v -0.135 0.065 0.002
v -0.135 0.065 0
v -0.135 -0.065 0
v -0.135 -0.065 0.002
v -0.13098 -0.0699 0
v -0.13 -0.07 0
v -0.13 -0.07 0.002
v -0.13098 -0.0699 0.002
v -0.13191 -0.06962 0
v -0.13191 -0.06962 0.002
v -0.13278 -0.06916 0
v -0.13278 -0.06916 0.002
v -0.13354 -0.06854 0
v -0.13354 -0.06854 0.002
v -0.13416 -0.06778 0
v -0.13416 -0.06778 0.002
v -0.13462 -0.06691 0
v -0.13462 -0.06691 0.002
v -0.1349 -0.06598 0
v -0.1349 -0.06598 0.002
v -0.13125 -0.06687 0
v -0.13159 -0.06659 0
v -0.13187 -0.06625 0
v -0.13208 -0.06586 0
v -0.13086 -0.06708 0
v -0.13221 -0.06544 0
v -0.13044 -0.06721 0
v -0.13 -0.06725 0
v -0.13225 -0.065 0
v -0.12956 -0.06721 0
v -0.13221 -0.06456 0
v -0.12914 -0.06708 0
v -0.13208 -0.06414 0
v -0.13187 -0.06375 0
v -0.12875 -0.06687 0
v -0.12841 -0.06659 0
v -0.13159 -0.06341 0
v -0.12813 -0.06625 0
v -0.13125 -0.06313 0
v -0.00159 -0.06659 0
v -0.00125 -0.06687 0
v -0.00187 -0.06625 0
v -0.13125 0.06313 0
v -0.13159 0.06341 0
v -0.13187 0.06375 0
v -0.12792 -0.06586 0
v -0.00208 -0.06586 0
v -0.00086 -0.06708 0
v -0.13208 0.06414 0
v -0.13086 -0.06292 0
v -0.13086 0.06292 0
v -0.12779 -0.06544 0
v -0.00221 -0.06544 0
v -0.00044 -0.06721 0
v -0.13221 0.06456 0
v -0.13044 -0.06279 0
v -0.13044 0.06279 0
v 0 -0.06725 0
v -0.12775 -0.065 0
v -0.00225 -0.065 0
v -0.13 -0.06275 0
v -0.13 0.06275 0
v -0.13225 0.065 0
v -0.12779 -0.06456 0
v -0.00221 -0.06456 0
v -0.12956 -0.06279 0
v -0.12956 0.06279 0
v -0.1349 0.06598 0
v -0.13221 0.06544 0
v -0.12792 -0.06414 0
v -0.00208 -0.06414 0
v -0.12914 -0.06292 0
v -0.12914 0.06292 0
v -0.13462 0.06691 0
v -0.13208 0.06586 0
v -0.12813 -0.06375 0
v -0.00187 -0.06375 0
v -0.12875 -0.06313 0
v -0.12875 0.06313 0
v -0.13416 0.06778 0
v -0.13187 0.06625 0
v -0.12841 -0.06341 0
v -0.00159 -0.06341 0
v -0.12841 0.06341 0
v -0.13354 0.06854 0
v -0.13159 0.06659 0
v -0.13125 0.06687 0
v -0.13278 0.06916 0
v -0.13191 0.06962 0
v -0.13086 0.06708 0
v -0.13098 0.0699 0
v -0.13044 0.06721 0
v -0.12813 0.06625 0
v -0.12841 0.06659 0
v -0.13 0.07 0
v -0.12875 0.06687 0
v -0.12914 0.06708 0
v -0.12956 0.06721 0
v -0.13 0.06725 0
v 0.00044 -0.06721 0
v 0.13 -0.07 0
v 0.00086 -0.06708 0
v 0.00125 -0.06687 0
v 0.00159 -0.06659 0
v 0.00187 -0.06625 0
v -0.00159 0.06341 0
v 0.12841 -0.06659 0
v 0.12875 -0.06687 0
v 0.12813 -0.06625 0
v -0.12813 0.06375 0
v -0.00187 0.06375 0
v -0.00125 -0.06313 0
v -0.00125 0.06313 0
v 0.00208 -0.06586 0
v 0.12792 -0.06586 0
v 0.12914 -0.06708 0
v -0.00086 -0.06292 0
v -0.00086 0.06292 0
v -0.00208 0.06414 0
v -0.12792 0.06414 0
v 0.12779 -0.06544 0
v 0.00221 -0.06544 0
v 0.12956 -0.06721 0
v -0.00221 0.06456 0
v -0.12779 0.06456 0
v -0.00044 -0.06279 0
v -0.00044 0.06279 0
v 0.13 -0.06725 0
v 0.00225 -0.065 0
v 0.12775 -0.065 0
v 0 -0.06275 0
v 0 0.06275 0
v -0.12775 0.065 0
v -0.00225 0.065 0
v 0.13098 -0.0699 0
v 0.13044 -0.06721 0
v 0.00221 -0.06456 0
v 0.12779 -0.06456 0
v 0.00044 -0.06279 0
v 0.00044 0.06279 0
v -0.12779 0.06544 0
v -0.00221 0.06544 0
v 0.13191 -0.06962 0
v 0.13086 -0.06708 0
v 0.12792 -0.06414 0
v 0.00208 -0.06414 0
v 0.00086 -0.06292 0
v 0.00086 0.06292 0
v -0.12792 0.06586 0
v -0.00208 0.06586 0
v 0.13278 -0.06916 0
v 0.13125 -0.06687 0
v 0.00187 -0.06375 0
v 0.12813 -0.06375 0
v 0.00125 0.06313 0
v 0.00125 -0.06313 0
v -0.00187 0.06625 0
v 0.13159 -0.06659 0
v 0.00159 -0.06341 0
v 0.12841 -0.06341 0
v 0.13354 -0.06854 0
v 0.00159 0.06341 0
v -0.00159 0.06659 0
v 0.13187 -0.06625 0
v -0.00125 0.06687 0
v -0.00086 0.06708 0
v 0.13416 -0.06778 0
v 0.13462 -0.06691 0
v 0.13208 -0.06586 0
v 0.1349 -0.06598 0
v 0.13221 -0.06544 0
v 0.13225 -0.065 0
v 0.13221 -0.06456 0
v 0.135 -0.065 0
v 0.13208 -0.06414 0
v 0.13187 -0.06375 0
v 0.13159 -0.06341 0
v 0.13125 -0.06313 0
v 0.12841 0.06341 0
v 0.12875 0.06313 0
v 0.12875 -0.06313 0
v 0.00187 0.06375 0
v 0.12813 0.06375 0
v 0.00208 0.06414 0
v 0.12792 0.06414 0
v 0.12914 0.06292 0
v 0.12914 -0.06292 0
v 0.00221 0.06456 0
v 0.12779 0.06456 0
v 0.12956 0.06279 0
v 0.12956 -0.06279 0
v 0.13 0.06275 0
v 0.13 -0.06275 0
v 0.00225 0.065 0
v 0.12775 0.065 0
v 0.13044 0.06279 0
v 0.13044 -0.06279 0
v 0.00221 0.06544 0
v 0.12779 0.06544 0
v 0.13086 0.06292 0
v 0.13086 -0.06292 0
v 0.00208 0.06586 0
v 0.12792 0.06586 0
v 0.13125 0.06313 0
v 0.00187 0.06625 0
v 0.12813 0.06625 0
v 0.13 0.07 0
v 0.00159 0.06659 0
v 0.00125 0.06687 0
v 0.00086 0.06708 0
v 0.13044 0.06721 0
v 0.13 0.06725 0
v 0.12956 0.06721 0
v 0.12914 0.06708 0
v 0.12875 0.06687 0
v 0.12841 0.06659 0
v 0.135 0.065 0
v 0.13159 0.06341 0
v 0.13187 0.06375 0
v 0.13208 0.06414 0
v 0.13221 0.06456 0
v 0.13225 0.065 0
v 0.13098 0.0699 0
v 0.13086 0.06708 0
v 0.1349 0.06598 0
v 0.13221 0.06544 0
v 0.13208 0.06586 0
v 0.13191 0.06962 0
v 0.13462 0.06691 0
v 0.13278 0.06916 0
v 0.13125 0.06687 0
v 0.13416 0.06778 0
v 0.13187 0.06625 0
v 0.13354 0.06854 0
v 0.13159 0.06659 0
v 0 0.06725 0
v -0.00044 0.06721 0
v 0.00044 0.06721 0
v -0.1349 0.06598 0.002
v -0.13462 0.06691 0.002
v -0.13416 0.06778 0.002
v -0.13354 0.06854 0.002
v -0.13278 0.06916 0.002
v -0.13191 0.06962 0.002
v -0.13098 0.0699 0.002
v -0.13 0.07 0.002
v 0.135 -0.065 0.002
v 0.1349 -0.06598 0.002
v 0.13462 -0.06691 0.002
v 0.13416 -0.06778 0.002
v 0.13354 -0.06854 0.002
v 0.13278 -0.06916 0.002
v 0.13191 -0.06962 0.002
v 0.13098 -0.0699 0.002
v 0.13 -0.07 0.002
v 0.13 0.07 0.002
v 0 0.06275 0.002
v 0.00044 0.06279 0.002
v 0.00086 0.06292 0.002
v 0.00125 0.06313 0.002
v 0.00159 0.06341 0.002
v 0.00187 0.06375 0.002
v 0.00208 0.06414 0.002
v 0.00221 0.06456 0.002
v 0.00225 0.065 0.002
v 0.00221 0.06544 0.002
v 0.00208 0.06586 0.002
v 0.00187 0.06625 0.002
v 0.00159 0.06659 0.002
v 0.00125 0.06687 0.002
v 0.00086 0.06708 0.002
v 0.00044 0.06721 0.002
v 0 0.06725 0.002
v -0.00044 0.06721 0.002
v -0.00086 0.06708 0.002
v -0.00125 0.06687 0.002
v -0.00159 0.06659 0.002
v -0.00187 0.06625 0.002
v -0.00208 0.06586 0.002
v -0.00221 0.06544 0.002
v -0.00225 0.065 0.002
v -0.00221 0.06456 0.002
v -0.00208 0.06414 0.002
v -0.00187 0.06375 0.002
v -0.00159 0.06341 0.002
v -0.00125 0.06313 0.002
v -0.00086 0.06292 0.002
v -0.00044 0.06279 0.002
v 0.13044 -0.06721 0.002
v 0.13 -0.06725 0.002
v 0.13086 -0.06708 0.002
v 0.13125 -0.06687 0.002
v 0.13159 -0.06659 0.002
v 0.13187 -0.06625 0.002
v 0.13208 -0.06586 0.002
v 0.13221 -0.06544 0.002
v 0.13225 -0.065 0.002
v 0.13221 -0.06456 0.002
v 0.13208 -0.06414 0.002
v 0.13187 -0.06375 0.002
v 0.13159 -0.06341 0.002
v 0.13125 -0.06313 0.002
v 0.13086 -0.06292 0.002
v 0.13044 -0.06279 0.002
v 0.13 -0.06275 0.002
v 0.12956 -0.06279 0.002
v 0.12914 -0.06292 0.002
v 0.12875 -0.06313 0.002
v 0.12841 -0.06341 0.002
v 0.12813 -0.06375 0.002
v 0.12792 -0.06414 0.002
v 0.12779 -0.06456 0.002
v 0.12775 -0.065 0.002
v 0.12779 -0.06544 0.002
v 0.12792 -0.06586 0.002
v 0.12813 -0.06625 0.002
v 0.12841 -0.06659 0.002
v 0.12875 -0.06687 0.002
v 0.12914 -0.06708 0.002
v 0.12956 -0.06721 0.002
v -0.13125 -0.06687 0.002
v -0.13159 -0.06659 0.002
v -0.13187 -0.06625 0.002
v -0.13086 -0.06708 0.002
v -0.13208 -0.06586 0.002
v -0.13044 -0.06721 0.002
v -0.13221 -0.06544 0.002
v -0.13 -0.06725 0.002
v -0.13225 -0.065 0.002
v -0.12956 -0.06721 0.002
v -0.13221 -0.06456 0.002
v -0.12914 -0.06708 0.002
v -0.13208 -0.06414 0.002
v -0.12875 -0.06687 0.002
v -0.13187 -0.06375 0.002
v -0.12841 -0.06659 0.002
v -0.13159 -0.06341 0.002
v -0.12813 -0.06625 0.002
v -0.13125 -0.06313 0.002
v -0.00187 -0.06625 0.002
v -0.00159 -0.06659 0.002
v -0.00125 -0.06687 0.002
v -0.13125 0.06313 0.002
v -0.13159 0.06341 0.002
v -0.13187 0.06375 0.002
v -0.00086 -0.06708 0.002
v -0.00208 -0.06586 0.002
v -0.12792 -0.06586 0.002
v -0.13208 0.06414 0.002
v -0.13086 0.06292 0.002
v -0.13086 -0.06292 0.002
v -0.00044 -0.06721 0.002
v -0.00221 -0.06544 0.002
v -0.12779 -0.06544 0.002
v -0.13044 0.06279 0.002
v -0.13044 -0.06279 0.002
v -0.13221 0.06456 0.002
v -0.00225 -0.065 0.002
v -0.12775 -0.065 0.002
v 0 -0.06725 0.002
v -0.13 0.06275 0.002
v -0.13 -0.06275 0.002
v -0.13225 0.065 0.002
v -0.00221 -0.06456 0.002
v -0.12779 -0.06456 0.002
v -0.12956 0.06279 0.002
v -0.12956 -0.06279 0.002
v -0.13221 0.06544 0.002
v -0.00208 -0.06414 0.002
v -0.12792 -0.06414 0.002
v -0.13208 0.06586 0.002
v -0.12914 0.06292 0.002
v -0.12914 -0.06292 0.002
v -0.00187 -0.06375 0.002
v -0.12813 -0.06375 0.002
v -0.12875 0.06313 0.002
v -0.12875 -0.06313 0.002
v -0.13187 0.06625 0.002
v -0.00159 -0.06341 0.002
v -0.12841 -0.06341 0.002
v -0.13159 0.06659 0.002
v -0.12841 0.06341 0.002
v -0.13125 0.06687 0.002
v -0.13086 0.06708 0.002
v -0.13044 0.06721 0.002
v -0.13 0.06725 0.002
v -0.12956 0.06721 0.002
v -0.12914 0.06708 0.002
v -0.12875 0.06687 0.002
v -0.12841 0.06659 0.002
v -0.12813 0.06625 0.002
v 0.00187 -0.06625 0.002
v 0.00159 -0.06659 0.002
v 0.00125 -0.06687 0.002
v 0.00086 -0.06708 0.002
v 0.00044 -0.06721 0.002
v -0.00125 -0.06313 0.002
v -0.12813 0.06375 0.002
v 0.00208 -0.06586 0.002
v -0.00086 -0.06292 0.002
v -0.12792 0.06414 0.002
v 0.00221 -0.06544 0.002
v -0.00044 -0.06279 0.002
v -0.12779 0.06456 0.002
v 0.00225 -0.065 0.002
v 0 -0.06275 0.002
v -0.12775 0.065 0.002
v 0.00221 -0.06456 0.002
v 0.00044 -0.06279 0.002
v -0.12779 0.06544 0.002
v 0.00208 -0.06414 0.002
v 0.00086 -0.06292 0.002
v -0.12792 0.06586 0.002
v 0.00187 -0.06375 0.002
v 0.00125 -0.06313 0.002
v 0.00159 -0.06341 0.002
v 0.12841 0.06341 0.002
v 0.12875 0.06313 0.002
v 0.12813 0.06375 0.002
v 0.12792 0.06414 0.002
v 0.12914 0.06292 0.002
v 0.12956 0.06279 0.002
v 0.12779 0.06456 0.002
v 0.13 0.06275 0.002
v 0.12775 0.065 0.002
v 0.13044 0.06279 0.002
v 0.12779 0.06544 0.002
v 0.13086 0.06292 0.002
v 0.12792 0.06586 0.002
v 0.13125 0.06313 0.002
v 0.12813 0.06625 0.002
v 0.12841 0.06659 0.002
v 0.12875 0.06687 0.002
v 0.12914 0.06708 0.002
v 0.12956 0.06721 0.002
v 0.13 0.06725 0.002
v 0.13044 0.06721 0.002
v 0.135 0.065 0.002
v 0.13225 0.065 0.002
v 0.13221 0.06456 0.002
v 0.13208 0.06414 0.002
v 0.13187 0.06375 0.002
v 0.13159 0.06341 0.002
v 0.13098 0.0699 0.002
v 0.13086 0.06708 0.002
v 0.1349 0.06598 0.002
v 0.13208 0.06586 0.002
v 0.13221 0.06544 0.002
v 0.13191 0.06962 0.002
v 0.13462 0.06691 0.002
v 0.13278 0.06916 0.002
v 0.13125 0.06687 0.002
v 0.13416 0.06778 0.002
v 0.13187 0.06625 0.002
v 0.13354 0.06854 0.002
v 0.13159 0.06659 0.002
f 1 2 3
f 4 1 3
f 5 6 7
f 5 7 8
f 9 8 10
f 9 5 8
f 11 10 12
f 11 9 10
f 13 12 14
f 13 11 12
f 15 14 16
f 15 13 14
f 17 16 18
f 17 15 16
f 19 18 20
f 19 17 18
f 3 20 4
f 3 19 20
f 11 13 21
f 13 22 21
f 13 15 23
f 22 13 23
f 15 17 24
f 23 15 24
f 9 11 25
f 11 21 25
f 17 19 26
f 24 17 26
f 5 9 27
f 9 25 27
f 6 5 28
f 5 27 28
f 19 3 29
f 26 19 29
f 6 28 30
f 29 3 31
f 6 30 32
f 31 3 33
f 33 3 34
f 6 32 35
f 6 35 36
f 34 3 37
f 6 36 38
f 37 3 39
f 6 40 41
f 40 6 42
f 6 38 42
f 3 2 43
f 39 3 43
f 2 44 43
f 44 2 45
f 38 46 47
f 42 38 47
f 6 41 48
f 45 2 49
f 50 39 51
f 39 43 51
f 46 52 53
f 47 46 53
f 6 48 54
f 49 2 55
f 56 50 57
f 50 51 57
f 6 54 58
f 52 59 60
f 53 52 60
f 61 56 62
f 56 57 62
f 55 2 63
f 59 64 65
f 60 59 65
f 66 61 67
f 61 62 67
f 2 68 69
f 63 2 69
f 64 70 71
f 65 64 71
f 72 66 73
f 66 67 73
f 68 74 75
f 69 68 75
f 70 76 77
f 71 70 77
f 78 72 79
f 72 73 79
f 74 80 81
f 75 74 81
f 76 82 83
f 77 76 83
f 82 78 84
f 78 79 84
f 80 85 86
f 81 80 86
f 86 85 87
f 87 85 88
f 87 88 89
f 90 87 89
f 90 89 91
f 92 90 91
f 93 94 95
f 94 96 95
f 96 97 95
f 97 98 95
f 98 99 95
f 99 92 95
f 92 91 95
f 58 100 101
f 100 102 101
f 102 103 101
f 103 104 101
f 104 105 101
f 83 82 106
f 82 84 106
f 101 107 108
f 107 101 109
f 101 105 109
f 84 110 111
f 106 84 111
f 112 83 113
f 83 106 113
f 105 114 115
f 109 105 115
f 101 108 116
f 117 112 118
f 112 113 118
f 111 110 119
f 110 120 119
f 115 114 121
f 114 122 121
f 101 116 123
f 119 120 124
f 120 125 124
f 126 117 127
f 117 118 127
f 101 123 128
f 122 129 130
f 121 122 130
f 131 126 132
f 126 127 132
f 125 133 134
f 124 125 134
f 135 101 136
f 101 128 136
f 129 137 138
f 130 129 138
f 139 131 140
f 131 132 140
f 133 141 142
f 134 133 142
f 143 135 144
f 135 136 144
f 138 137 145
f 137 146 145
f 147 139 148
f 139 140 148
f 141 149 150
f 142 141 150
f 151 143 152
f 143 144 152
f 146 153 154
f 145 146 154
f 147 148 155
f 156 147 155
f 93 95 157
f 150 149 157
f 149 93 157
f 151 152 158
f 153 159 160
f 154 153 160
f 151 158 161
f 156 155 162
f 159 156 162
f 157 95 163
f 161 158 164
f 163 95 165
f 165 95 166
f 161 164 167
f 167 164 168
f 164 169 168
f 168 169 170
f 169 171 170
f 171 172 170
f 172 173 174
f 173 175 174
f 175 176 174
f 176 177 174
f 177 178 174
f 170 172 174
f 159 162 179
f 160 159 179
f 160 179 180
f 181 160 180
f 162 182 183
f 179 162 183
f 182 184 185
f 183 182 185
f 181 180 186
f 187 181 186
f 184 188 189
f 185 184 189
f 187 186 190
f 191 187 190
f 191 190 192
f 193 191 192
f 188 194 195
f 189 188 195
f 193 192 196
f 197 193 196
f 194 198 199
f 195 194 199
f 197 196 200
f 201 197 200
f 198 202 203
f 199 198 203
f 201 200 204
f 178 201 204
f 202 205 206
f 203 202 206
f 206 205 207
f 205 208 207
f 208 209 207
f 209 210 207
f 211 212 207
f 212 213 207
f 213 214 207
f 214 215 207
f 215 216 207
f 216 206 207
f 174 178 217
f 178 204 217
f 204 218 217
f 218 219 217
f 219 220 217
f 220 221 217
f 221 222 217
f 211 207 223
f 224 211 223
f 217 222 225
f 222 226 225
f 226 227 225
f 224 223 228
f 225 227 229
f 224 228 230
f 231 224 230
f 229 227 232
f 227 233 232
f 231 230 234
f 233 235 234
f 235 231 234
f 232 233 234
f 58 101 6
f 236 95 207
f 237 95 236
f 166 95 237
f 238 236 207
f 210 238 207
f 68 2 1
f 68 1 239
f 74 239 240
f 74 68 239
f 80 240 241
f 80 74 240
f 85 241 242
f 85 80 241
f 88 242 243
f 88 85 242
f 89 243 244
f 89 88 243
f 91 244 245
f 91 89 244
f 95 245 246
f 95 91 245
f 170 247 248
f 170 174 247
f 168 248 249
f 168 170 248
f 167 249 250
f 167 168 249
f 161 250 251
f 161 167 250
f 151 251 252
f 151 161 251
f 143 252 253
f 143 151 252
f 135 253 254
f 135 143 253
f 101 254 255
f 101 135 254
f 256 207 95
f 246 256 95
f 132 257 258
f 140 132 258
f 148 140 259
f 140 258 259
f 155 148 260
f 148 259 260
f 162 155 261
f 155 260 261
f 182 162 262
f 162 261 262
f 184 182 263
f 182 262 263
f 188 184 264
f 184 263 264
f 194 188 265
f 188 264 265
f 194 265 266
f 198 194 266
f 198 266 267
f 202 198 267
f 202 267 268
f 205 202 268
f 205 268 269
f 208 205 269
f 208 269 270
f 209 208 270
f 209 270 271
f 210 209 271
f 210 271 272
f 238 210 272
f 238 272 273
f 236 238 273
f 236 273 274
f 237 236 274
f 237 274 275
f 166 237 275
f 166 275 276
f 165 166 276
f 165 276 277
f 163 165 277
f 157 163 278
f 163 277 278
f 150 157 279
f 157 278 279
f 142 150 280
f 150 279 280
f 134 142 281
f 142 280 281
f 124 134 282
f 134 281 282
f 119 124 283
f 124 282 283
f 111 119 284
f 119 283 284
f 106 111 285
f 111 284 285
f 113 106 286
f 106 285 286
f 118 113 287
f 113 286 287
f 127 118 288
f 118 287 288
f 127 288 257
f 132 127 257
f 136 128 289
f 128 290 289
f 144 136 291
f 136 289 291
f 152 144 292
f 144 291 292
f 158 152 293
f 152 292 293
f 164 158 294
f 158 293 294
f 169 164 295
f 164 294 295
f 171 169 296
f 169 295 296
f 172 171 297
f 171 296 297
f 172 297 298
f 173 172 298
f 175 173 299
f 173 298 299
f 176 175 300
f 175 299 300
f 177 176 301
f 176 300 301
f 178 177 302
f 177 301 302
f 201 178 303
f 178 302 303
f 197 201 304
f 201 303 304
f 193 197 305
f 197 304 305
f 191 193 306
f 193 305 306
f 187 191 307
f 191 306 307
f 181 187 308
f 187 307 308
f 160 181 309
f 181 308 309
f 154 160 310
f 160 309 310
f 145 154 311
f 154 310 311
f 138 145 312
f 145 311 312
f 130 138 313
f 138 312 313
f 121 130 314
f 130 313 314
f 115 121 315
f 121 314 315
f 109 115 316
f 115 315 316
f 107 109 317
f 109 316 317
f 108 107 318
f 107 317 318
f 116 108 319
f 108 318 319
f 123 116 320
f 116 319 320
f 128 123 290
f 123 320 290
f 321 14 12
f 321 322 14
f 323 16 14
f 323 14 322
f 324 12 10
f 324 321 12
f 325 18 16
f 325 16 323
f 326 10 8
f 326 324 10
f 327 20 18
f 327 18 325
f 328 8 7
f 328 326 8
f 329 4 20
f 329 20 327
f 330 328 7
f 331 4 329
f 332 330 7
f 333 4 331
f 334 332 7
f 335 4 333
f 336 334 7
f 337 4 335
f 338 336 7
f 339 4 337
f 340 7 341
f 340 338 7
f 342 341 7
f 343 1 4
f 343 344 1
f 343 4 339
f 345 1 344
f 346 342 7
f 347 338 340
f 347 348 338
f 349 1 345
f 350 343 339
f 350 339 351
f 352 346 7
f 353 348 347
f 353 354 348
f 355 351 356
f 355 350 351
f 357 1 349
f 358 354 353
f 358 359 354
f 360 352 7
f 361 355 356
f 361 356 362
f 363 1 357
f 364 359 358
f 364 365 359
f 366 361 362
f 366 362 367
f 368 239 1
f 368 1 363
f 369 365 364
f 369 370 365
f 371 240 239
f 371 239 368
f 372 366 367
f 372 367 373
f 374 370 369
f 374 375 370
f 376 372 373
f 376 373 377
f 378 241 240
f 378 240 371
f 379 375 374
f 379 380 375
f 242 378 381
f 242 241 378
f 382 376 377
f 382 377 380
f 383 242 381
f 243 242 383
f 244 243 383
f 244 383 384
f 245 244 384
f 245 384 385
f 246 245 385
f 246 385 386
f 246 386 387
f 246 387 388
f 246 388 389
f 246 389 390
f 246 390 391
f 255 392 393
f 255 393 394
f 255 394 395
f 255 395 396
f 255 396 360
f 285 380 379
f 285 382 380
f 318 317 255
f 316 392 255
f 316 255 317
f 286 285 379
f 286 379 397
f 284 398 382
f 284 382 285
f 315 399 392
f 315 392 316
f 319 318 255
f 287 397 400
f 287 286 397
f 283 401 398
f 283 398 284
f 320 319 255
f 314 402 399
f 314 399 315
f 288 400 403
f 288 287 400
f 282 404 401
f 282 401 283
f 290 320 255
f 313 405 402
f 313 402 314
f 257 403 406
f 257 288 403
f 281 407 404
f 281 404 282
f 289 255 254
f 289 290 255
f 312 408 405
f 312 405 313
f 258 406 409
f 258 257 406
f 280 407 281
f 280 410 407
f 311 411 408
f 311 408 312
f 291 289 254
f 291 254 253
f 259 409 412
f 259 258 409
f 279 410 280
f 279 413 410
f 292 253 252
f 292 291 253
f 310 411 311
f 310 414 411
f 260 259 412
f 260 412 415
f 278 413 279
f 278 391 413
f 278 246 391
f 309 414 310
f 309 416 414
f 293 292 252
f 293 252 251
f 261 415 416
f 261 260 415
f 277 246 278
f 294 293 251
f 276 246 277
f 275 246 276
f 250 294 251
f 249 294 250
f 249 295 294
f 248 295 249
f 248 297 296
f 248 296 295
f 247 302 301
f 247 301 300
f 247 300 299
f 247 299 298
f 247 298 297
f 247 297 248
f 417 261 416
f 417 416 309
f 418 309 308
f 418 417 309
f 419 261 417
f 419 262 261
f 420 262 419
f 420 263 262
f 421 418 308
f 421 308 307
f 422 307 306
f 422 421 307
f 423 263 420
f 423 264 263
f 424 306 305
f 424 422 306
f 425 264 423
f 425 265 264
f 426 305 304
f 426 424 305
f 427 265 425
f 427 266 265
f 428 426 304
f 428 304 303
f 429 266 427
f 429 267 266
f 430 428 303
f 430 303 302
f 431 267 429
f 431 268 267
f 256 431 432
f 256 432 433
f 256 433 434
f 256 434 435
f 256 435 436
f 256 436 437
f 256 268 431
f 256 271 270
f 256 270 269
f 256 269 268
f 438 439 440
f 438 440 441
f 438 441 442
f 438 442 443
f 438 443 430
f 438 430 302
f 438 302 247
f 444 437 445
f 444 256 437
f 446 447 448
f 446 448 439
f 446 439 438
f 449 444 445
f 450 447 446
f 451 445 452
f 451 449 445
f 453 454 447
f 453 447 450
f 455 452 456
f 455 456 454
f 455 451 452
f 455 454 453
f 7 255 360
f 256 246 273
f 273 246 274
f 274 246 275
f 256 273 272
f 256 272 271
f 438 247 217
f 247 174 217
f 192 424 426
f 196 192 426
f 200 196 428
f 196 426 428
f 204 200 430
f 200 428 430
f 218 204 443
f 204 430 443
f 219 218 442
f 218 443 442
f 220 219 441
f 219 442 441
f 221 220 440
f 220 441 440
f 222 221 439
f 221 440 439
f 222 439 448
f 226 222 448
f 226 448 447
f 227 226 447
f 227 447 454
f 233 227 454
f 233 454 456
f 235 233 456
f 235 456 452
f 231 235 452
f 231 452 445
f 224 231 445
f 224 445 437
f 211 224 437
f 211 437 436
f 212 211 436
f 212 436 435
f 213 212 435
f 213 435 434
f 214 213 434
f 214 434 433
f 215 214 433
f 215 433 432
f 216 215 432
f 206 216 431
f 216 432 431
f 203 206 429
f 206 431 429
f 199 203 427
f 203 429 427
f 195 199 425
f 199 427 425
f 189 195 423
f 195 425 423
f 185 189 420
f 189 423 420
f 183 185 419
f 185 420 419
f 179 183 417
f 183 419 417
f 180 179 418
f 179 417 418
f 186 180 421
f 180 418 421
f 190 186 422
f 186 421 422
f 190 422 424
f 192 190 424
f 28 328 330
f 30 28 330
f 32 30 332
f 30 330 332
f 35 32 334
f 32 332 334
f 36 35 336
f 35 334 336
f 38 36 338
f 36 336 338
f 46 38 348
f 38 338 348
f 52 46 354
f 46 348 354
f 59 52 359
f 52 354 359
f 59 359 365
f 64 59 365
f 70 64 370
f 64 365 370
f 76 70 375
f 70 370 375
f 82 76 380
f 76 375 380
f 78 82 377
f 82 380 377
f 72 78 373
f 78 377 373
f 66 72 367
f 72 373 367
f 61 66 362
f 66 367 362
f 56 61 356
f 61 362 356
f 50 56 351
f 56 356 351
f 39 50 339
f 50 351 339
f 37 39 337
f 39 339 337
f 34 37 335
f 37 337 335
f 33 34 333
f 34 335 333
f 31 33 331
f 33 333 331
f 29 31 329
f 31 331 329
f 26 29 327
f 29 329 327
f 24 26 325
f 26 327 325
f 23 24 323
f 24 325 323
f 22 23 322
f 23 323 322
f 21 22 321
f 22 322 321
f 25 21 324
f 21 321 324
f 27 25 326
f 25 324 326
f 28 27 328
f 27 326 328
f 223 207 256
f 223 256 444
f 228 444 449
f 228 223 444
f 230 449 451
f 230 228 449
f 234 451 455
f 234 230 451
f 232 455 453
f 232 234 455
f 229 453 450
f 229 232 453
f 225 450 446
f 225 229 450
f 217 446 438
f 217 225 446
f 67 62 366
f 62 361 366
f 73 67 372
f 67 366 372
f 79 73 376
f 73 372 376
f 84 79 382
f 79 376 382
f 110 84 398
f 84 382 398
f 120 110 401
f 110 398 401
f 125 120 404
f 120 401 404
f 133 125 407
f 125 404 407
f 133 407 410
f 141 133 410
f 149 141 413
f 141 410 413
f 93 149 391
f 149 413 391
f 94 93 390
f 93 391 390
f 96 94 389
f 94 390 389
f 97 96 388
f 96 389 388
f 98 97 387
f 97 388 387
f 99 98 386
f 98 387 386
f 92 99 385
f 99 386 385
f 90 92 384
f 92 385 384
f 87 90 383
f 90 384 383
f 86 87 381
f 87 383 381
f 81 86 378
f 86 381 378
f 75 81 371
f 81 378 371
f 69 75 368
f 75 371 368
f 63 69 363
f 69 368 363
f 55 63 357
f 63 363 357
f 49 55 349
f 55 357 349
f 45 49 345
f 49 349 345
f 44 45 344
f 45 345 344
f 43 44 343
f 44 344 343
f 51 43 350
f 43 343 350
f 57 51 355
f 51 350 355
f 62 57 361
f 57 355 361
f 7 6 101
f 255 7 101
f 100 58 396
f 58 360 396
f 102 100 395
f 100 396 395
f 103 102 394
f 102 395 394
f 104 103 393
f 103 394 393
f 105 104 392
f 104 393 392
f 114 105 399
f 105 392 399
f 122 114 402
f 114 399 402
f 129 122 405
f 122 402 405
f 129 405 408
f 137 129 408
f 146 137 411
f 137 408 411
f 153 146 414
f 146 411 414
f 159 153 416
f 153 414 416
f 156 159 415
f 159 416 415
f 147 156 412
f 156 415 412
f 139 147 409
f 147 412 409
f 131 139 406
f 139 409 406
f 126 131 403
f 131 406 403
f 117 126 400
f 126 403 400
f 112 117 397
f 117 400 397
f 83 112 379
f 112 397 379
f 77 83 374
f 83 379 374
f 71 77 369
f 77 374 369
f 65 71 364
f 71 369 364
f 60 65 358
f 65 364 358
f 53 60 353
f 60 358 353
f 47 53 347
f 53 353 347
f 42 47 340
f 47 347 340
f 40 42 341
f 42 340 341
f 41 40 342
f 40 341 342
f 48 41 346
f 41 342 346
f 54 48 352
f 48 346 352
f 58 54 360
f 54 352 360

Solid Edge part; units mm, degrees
sketch "Sketch1" plane through (0, 0, 0) normal (0, 0, 1) x (1, 0, 0)
  line L0 (-0.13, -0.07) -> (0.13, -0.07)
  arc A0 (0.13, -0.07) -> (0.135, -0.065) centre (0.13, -0.065) ccw
  line L1 (0.135, -0.065) -> (0.135, 0.065)
  arc A1 (0.135, 0.065) -> (0.13, 0.07) centre (0.13, 0.065) ccw
  line L2 (0.13, 0.07) -> (-0.13, 0.07)
  arc A2 (-0.13, 0.07) -> (-0.135, 0.065) centre (-0.13, 0.065) ccw
  line L3 (-0.135, 0.065) -> (-0.135, -0.065)
  arc A3 (-0.135, -0.065) -> (-0.13, -0.07) centre (-0.13, -0.065) ccw
  dimension "D1" = 0.27
  dimension "D2" = 0.14
extrude "Protrusion1" add sketch "Sketch1" along normal blind 0.002
hole "Bohrung_1" at (0, 0.065, 0.002) direction (0, 0, -1) diameter 0.0045 end up to next
hole "Hole1" at (0.13, 0.065, 0.002) direction (0, 0, -1) diameter 0.0045 end up to next
hole "Hole2" at (0.13, -0.065, 0.002) direction (0, 0, -1) diameter 0.0045 end up to next
hole "Hole3" at (0, -0.065, 0.002) direction (0, 0, -1) diameter 0.0045 end up to next
hole "Hole4" at (-0.13, -0.065, 0.002) direction (0, 0, -1) diameter 0.0045 end up to next
hole "Hole5" at (-0.13, 0.065, 0.002) direction (0, 0, -1) diameter 0.0045 end up to next
